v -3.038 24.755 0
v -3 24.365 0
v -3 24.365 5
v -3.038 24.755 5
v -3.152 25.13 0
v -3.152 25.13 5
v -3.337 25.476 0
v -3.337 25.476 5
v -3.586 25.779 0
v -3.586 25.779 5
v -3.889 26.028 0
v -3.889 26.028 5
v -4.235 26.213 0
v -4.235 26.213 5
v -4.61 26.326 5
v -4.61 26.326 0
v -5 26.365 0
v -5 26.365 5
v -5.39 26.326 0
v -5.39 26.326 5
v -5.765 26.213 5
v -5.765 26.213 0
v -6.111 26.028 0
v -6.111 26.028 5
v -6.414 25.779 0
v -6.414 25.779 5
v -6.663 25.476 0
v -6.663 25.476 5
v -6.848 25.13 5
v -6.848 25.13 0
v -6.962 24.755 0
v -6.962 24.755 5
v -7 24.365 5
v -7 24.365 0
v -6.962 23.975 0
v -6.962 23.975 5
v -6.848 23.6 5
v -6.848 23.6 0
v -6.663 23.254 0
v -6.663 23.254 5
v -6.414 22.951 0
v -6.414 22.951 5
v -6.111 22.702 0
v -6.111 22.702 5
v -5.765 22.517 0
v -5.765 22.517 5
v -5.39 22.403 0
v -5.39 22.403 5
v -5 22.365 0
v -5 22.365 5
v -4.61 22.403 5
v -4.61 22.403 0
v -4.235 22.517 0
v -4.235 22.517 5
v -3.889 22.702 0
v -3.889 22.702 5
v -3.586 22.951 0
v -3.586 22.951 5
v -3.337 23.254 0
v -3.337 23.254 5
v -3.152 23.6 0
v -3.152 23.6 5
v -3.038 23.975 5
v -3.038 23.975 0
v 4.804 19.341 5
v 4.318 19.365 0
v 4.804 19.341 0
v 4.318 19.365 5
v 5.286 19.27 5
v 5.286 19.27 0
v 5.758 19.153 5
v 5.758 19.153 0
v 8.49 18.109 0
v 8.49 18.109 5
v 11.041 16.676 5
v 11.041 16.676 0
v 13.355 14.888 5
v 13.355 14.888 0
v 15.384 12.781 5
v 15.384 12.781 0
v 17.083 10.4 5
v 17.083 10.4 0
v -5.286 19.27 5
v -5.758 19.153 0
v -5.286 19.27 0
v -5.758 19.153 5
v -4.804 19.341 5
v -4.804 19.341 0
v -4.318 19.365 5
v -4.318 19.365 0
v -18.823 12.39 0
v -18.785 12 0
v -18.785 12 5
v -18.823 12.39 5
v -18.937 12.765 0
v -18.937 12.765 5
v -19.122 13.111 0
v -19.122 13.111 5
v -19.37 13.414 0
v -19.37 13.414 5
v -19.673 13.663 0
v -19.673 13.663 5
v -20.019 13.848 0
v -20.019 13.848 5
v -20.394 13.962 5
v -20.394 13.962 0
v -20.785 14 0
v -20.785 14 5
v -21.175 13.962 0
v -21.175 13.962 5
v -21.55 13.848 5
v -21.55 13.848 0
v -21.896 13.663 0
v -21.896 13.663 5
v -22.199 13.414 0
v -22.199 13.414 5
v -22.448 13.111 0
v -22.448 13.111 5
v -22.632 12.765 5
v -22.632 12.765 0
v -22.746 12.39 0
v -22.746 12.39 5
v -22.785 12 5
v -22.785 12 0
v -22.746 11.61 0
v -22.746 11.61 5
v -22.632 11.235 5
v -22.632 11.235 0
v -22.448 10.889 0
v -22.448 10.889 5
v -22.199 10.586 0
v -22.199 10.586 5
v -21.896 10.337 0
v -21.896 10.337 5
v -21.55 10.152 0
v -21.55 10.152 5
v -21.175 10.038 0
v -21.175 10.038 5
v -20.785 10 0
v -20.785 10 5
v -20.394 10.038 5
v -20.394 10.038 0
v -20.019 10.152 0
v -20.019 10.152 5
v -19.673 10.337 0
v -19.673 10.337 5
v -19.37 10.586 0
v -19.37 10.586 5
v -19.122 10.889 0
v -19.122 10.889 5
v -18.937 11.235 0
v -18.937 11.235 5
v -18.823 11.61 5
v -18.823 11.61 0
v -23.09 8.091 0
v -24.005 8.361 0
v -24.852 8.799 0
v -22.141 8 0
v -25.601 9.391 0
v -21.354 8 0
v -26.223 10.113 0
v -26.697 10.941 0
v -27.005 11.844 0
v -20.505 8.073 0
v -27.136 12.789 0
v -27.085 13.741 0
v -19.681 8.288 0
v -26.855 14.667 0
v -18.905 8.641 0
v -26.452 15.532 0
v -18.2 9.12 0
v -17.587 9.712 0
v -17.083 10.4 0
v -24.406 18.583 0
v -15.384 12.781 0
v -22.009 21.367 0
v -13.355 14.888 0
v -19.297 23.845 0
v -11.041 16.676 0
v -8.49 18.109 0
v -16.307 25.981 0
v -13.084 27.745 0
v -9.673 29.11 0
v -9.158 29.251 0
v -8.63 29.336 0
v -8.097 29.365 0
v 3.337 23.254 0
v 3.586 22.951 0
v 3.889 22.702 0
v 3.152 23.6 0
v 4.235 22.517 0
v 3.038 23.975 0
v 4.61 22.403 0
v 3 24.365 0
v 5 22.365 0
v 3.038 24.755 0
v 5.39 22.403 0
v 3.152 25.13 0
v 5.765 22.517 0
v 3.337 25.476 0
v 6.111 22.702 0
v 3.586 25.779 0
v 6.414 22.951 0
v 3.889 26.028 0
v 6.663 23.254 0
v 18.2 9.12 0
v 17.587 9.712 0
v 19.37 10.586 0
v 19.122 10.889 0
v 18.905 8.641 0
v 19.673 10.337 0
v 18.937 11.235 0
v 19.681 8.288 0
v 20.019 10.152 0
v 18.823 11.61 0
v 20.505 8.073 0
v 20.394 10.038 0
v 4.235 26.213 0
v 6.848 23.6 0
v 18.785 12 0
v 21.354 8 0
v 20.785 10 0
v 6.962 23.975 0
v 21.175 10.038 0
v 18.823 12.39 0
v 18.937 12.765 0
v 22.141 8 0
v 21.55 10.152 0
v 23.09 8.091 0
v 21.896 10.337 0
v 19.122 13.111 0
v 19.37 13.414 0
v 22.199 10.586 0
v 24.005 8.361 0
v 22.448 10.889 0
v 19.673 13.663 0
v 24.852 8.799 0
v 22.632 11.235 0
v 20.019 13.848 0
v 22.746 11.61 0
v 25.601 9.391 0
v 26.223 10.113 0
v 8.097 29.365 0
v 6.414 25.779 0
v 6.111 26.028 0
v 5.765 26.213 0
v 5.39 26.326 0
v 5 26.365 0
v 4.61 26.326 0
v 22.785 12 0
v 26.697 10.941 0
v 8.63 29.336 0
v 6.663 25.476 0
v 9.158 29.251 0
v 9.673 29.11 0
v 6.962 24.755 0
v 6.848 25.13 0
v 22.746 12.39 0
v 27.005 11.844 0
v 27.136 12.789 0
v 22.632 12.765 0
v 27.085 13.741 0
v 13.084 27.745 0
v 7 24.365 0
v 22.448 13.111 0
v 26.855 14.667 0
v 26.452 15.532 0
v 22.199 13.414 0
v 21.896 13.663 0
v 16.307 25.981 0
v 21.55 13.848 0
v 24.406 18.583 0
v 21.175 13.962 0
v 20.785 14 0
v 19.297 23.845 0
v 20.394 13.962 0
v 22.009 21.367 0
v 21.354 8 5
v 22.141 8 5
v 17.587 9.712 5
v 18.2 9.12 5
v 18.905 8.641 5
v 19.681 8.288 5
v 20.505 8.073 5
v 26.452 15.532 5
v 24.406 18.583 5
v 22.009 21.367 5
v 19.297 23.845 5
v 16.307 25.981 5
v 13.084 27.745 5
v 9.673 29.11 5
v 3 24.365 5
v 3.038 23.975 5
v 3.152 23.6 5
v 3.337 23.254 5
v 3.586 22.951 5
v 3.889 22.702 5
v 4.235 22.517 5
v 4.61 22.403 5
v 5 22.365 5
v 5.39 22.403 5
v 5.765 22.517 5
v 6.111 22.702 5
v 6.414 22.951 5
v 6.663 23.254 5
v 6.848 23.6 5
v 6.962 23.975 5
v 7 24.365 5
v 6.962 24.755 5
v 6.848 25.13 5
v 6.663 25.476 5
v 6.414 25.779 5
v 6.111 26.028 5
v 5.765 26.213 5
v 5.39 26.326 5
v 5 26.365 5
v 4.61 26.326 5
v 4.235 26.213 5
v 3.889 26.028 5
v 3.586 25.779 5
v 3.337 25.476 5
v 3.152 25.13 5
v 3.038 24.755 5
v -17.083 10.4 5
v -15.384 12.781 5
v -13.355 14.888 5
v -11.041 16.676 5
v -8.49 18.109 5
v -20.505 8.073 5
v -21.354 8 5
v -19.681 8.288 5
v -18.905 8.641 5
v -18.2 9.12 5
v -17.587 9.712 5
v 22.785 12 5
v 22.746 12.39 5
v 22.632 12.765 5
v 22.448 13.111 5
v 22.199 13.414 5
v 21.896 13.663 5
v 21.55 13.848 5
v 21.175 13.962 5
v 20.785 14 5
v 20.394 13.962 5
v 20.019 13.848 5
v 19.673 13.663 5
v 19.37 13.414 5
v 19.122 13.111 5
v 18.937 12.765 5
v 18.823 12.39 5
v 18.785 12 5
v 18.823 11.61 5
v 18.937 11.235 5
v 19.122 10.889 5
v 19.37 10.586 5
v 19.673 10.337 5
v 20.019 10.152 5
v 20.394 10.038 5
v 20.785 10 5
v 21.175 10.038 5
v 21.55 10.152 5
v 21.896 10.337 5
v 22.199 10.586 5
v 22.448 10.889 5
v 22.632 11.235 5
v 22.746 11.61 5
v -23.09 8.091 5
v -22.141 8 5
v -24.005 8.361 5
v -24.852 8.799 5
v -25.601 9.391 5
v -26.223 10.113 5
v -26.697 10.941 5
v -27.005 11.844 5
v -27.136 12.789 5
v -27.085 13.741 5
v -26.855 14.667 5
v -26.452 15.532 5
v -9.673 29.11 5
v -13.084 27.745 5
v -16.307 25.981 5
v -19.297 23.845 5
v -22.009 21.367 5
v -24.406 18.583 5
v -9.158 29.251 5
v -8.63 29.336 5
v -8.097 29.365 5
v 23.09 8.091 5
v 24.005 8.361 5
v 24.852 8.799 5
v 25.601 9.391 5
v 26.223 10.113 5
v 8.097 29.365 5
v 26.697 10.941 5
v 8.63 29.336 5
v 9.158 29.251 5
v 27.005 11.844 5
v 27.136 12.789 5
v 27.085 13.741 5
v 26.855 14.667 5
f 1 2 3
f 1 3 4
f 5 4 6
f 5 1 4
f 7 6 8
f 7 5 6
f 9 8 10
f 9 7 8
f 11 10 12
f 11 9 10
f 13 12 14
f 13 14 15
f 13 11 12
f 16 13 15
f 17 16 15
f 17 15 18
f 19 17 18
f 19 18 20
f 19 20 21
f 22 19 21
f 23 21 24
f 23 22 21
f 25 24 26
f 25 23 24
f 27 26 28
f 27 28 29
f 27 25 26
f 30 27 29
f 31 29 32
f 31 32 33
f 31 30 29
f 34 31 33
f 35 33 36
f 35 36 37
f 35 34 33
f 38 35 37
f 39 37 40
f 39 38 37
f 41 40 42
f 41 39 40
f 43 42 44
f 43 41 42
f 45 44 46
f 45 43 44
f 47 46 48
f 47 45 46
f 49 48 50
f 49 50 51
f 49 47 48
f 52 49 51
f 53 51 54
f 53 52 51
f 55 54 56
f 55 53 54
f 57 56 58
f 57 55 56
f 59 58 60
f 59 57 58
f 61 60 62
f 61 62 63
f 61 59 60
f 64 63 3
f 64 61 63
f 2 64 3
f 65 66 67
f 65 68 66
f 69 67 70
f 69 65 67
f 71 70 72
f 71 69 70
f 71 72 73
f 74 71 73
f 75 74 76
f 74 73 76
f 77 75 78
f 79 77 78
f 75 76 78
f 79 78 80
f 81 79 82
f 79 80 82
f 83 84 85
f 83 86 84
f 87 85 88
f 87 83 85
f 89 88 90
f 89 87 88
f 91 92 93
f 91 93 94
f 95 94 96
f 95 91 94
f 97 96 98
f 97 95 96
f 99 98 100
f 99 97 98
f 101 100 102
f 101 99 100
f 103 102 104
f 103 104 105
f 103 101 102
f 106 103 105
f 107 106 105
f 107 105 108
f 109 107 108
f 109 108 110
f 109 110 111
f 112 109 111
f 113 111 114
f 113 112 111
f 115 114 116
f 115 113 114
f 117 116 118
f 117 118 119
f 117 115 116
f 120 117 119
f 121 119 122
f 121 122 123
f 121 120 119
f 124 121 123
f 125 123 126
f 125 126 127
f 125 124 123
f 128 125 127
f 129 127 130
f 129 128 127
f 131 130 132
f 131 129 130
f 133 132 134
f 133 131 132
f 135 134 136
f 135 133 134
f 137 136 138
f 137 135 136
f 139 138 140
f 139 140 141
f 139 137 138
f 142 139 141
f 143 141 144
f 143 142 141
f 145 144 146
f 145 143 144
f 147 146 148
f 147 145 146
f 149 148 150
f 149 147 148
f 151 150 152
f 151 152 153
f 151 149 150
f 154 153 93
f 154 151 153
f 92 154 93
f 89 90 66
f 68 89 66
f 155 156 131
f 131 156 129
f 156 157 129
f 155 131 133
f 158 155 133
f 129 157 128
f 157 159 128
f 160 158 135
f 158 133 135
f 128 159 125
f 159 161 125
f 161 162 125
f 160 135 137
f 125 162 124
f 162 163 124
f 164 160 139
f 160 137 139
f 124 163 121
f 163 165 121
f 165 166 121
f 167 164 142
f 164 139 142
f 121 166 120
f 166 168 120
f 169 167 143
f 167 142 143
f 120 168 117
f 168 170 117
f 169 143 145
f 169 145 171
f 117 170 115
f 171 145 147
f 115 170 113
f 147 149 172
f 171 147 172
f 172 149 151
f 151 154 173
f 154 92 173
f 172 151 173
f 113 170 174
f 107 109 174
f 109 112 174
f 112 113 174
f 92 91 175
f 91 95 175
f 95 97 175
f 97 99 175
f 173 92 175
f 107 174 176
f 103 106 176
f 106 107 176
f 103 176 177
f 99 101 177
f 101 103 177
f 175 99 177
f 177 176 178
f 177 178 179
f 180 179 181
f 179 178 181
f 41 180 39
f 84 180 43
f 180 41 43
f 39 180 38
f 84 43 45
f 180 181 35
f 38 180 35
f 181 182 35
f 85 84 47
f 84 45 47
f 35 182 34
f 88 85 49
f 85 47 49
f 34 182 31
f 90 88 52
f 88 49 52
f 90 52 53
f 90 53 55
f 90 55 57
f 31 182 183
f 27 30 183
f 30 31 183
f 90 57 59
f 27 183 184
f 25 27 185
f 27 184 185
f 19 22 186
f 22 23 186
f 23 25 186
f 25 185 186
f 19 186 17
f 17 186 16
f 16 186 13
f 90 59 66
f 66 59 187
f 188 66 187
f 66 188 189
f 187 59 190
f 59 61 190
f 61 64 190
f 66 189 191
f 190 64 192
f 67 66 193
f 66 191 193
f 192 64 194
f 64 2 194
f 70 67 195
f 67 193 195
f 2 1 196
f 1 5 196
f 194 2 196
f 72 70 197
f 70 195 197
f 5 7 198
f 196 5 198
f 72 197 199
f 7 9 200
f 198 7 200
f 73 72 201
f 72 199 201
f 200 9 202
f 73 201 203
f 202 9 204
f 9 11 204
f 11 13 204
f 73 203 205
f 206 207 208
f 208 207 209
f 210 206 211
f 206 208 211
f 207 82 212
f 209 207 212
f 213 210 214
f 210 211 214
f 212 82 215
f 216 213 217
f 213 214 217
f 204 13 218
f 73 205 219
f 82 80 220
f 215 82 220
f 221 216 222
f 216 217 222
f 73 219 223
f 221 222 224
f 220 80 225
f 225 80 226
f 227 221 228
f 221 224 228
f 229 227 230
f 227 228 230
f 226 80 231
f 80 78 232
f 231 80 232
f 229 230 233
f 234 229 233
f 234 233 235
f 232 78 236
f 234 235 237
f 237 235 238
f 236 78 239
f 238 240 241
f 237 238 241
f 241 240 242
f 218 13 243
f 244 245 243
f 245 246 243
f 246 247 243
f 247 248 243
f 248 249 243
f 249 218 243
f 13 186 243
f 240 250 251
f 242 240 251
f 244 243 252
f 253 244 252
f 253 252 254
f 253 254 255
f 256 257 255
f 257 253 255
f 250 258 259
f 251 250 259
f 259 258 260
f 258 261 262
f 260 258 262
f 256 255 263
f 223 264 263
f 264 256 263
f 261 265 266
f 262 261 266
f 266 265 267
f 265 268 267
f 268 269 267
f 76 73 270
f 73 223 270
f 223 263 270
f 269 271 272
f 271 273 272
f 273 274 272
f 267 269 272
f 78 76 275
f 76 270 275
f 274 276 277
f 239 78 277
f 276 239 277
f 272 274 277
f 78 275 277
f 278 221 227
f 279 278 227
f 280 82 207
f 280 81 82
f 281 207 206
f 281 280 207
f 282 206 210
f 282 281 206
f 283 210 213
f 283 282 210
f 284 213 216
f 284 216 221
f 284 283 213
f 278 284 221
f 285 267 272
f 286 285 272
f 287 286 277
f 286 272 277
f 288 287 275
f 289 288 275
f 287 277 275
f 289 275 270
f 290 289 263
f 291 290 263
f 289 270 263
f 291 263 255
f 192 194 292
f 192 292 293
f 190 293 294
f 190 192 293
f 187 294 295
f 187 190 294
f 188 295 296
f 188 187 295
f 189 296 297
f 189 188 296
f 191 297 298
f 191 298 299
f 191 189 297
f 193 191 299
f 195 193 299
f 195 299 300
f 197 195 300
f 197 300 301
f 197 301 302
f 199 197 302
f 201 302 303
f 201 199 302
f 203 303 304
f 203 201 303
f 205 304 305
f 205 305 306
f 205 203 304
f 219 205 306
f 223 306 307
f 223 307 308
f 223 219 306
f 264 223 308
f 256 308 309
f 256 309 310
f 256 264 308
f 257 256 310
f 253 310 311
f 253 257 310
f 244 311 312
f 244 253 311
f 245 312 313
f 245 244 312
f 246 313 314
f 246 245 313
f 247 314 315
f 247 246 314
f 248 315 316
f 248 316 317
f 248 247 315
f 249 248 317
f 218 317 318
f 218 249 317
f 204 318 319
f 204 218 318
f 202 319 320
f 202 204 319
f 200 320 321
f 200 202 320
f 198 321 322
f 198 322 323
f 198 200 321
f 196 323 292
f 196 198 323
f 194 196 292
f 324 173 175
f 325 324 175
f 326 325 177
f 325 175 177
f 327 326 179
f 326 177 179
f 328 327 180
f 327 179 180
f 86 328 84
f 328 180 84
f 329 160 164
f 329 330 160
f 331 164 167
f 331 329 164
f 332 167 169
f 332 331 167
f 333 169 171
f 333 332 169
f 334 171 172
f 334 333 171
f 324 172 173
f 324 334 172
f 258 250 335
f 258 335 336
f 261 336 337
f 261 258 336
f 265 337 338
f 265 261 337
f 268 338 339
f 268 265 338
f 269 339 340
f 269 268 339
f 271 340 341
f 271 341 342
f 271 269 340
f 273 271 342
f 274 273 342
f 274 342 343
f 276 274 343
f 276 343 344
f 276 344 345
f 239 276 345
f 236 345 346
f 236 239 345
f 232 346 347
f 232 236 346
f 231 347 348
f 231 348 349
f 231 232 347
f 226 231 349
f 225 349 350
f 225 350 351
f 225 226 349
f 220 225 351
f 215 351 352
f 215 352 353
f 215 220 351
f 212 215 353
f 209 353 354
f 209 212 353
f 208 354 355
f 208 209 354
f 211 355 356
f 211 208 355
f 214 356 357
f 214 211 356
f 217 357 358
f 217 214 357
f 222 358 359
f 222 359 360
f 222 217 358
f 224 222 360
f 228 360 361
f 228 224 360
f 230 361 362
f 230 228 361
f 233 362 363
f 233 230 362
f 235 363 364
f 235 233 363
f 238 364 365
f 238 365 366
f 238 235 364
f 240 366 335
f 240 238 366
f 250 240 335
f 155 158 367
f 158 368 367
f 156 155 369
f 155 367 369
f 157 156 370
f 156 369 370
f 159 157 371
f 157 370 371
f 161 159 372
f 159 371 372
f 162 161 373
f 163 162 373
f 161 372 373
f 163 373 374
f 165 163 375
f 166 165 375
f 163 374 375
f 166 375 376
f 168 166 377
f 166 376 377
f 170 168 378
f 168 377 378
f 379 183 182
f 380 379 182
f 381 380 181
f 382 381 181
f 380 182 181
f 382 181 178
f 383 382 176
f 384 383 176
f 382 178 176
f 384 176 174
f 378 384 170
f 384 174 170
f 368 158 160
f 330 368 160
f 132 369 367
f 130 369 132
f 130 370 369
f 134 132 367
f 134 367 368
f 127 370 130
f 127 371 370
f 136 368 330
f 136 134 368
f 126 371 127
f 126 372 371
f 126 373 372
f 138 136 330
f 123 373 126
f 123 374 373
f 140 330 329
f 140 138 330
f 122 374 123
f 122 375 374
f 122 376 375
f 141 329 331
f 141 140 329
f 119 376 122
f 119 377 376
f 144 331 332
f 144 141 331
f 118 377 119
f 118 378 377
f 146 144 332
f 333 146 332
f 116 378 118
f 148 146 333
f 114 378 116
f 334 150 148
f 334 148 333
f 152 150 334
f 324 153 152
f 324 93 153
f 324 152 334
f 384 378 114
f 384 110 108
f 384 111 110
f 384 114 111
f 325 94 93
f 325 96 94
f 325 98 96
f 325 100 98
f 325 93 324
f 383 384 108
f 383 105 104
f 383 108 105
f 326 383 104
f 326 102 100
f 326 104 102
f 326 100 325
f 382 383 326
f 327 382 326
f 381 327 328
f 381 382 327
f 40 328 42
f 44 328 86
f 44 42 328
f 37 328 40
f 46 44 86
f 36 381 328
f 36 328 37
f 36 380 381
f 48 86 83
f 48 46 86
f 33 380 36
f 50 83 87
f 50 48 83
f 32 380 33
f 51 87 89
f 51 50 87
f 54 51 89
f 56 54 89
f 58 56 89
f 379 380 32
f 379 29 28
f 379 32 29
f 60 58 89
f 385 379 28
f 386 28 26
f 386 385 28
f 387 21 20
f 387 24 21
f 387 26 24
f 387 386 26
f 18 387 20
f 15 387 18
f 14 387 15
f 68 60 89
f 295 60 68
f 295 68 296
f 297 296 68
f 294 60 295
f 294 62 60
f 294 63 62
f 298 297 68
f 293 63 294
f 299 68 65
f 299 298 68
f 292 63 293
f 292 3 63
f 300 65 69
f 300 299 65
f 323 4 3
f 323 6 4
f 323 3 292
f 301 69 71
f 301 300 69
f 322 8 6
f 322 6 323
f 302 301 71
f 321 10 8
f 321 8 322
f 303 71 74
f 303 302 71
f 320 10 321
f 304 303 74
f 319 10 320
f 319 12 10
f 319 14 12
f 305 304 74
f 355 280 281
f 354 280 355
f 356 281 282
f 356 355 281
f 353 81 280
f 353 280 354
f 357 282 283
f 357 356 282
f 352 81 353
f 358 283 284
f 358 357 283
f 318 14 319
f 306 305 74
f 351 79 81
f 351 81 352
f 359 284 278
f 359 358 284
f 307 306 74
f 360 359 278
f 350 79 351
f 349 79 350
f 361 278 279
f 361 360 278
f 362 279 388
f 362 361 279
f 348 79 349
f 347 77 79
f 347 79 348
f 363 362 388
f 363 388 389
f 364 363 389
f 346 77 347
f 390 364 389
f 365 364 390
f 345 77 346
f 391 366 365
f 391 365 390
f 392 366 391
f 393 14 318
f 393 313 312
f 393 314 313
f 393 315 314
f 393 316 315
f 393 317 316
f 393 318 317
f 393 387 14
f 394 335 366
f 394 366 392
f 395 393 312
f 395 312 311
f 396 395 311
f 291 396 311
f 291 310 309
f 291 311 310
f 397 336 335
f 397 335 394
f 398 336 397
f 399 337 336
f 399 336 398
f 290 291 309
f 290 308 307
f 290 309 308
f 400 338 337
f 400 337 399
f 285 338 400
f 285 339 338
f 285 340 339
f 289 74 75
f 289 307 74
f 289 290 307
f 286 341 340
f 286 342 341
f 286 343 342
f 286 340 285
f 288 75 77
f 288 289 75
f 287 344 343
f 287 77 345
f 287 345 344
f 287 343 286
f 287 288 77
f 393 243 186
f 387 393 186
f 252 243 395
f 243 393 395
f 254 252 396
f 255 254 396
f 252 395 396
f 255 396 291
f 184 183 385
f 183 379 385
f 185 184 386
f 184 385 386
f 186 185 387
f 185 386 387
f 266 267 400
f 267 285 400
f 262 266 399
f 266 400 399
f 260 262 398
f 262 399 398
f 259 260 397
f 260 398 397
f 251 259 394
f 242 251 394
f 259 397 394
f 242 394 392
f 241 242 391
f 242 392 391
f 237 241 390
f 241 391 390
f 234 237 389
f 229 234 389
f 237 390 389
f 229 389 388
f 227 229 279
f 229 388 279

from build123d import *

# Parameters (mm, degrees)
SKETCH1_R           = 2
BOSS_EXTRUDE1_DEPTH = 5
FILLET1_R           = 5


with BuildPart() as part:
    # Sketch1 → Boss-Extrude1 (new body)
    with BuildSketch(Plane.XY):
        with BuildLine():
            Line((-29.613436562, 8), (-18.33030278, 8))
            ThreePointArc((-18.33030278, 8), (-12.975595941, 15.219523973), (-5, 19.364916731))
            Line((-5, 19.364916731), (5, 19.364916731))
            ThreePointArc((5, 19.364916731), (12.975595941, 15.219523973), (18.33030278, 8))
            Line((18.33030278, 8), (29.613436562, 8))
            ThreePointArc((29.613436562, 8), (22.00766613, 21.368627857), (8.868894541, 29.364916731))
            Line((8.868894541, 29.364916731), (-8.868894541, 29.364916731))
            ThreePointArc((-8.868894541, 29.364916731), (-22.00766613, 21.368627857), (-29.613436562, 8))
        make_face()
        with Locations((20.784609691, 12)):
            Circle(SKETCH1_R, mode=Mode.SUBTRACT)
        with Locations((-20.784609691, 12)):
            Circle(SKETCH1_R, mode=Mode.SUBTRACT)
        with Locations((-5, 24.364916731)):
            Circle(SKETCH1_R, mode=Mode.SUBTRACT)
        with Locations(Location((5, 24.364916731, 0), (0, 0, 180))):
            Circle(SKETCH1_R, mode=Mode.SUBTRACT)
    extrude(amount=BOSS_EXTRUDE1_DEPTH)

    # Fillet1
    fillet1_edges = [part.edges().sort_by_distance(p)[0] for p in [
        (-18.33030278, 8, 2.5),
        (-29.613436562, 8, 2.5),
        (-8.868894541, 29.364916731, 2.5),
        (8.868894541, 29.364916731, 2.5),
        (29.613436562, 8, 2.5),
        (18.33030278, 8, 2.5),
        (5, 19.364916731, 2.5),
        (-5, 19.364916731, 2.5),
    ]]
    fillet(fillet1_edges, radius=FILLET1_R)


solid = part.part
